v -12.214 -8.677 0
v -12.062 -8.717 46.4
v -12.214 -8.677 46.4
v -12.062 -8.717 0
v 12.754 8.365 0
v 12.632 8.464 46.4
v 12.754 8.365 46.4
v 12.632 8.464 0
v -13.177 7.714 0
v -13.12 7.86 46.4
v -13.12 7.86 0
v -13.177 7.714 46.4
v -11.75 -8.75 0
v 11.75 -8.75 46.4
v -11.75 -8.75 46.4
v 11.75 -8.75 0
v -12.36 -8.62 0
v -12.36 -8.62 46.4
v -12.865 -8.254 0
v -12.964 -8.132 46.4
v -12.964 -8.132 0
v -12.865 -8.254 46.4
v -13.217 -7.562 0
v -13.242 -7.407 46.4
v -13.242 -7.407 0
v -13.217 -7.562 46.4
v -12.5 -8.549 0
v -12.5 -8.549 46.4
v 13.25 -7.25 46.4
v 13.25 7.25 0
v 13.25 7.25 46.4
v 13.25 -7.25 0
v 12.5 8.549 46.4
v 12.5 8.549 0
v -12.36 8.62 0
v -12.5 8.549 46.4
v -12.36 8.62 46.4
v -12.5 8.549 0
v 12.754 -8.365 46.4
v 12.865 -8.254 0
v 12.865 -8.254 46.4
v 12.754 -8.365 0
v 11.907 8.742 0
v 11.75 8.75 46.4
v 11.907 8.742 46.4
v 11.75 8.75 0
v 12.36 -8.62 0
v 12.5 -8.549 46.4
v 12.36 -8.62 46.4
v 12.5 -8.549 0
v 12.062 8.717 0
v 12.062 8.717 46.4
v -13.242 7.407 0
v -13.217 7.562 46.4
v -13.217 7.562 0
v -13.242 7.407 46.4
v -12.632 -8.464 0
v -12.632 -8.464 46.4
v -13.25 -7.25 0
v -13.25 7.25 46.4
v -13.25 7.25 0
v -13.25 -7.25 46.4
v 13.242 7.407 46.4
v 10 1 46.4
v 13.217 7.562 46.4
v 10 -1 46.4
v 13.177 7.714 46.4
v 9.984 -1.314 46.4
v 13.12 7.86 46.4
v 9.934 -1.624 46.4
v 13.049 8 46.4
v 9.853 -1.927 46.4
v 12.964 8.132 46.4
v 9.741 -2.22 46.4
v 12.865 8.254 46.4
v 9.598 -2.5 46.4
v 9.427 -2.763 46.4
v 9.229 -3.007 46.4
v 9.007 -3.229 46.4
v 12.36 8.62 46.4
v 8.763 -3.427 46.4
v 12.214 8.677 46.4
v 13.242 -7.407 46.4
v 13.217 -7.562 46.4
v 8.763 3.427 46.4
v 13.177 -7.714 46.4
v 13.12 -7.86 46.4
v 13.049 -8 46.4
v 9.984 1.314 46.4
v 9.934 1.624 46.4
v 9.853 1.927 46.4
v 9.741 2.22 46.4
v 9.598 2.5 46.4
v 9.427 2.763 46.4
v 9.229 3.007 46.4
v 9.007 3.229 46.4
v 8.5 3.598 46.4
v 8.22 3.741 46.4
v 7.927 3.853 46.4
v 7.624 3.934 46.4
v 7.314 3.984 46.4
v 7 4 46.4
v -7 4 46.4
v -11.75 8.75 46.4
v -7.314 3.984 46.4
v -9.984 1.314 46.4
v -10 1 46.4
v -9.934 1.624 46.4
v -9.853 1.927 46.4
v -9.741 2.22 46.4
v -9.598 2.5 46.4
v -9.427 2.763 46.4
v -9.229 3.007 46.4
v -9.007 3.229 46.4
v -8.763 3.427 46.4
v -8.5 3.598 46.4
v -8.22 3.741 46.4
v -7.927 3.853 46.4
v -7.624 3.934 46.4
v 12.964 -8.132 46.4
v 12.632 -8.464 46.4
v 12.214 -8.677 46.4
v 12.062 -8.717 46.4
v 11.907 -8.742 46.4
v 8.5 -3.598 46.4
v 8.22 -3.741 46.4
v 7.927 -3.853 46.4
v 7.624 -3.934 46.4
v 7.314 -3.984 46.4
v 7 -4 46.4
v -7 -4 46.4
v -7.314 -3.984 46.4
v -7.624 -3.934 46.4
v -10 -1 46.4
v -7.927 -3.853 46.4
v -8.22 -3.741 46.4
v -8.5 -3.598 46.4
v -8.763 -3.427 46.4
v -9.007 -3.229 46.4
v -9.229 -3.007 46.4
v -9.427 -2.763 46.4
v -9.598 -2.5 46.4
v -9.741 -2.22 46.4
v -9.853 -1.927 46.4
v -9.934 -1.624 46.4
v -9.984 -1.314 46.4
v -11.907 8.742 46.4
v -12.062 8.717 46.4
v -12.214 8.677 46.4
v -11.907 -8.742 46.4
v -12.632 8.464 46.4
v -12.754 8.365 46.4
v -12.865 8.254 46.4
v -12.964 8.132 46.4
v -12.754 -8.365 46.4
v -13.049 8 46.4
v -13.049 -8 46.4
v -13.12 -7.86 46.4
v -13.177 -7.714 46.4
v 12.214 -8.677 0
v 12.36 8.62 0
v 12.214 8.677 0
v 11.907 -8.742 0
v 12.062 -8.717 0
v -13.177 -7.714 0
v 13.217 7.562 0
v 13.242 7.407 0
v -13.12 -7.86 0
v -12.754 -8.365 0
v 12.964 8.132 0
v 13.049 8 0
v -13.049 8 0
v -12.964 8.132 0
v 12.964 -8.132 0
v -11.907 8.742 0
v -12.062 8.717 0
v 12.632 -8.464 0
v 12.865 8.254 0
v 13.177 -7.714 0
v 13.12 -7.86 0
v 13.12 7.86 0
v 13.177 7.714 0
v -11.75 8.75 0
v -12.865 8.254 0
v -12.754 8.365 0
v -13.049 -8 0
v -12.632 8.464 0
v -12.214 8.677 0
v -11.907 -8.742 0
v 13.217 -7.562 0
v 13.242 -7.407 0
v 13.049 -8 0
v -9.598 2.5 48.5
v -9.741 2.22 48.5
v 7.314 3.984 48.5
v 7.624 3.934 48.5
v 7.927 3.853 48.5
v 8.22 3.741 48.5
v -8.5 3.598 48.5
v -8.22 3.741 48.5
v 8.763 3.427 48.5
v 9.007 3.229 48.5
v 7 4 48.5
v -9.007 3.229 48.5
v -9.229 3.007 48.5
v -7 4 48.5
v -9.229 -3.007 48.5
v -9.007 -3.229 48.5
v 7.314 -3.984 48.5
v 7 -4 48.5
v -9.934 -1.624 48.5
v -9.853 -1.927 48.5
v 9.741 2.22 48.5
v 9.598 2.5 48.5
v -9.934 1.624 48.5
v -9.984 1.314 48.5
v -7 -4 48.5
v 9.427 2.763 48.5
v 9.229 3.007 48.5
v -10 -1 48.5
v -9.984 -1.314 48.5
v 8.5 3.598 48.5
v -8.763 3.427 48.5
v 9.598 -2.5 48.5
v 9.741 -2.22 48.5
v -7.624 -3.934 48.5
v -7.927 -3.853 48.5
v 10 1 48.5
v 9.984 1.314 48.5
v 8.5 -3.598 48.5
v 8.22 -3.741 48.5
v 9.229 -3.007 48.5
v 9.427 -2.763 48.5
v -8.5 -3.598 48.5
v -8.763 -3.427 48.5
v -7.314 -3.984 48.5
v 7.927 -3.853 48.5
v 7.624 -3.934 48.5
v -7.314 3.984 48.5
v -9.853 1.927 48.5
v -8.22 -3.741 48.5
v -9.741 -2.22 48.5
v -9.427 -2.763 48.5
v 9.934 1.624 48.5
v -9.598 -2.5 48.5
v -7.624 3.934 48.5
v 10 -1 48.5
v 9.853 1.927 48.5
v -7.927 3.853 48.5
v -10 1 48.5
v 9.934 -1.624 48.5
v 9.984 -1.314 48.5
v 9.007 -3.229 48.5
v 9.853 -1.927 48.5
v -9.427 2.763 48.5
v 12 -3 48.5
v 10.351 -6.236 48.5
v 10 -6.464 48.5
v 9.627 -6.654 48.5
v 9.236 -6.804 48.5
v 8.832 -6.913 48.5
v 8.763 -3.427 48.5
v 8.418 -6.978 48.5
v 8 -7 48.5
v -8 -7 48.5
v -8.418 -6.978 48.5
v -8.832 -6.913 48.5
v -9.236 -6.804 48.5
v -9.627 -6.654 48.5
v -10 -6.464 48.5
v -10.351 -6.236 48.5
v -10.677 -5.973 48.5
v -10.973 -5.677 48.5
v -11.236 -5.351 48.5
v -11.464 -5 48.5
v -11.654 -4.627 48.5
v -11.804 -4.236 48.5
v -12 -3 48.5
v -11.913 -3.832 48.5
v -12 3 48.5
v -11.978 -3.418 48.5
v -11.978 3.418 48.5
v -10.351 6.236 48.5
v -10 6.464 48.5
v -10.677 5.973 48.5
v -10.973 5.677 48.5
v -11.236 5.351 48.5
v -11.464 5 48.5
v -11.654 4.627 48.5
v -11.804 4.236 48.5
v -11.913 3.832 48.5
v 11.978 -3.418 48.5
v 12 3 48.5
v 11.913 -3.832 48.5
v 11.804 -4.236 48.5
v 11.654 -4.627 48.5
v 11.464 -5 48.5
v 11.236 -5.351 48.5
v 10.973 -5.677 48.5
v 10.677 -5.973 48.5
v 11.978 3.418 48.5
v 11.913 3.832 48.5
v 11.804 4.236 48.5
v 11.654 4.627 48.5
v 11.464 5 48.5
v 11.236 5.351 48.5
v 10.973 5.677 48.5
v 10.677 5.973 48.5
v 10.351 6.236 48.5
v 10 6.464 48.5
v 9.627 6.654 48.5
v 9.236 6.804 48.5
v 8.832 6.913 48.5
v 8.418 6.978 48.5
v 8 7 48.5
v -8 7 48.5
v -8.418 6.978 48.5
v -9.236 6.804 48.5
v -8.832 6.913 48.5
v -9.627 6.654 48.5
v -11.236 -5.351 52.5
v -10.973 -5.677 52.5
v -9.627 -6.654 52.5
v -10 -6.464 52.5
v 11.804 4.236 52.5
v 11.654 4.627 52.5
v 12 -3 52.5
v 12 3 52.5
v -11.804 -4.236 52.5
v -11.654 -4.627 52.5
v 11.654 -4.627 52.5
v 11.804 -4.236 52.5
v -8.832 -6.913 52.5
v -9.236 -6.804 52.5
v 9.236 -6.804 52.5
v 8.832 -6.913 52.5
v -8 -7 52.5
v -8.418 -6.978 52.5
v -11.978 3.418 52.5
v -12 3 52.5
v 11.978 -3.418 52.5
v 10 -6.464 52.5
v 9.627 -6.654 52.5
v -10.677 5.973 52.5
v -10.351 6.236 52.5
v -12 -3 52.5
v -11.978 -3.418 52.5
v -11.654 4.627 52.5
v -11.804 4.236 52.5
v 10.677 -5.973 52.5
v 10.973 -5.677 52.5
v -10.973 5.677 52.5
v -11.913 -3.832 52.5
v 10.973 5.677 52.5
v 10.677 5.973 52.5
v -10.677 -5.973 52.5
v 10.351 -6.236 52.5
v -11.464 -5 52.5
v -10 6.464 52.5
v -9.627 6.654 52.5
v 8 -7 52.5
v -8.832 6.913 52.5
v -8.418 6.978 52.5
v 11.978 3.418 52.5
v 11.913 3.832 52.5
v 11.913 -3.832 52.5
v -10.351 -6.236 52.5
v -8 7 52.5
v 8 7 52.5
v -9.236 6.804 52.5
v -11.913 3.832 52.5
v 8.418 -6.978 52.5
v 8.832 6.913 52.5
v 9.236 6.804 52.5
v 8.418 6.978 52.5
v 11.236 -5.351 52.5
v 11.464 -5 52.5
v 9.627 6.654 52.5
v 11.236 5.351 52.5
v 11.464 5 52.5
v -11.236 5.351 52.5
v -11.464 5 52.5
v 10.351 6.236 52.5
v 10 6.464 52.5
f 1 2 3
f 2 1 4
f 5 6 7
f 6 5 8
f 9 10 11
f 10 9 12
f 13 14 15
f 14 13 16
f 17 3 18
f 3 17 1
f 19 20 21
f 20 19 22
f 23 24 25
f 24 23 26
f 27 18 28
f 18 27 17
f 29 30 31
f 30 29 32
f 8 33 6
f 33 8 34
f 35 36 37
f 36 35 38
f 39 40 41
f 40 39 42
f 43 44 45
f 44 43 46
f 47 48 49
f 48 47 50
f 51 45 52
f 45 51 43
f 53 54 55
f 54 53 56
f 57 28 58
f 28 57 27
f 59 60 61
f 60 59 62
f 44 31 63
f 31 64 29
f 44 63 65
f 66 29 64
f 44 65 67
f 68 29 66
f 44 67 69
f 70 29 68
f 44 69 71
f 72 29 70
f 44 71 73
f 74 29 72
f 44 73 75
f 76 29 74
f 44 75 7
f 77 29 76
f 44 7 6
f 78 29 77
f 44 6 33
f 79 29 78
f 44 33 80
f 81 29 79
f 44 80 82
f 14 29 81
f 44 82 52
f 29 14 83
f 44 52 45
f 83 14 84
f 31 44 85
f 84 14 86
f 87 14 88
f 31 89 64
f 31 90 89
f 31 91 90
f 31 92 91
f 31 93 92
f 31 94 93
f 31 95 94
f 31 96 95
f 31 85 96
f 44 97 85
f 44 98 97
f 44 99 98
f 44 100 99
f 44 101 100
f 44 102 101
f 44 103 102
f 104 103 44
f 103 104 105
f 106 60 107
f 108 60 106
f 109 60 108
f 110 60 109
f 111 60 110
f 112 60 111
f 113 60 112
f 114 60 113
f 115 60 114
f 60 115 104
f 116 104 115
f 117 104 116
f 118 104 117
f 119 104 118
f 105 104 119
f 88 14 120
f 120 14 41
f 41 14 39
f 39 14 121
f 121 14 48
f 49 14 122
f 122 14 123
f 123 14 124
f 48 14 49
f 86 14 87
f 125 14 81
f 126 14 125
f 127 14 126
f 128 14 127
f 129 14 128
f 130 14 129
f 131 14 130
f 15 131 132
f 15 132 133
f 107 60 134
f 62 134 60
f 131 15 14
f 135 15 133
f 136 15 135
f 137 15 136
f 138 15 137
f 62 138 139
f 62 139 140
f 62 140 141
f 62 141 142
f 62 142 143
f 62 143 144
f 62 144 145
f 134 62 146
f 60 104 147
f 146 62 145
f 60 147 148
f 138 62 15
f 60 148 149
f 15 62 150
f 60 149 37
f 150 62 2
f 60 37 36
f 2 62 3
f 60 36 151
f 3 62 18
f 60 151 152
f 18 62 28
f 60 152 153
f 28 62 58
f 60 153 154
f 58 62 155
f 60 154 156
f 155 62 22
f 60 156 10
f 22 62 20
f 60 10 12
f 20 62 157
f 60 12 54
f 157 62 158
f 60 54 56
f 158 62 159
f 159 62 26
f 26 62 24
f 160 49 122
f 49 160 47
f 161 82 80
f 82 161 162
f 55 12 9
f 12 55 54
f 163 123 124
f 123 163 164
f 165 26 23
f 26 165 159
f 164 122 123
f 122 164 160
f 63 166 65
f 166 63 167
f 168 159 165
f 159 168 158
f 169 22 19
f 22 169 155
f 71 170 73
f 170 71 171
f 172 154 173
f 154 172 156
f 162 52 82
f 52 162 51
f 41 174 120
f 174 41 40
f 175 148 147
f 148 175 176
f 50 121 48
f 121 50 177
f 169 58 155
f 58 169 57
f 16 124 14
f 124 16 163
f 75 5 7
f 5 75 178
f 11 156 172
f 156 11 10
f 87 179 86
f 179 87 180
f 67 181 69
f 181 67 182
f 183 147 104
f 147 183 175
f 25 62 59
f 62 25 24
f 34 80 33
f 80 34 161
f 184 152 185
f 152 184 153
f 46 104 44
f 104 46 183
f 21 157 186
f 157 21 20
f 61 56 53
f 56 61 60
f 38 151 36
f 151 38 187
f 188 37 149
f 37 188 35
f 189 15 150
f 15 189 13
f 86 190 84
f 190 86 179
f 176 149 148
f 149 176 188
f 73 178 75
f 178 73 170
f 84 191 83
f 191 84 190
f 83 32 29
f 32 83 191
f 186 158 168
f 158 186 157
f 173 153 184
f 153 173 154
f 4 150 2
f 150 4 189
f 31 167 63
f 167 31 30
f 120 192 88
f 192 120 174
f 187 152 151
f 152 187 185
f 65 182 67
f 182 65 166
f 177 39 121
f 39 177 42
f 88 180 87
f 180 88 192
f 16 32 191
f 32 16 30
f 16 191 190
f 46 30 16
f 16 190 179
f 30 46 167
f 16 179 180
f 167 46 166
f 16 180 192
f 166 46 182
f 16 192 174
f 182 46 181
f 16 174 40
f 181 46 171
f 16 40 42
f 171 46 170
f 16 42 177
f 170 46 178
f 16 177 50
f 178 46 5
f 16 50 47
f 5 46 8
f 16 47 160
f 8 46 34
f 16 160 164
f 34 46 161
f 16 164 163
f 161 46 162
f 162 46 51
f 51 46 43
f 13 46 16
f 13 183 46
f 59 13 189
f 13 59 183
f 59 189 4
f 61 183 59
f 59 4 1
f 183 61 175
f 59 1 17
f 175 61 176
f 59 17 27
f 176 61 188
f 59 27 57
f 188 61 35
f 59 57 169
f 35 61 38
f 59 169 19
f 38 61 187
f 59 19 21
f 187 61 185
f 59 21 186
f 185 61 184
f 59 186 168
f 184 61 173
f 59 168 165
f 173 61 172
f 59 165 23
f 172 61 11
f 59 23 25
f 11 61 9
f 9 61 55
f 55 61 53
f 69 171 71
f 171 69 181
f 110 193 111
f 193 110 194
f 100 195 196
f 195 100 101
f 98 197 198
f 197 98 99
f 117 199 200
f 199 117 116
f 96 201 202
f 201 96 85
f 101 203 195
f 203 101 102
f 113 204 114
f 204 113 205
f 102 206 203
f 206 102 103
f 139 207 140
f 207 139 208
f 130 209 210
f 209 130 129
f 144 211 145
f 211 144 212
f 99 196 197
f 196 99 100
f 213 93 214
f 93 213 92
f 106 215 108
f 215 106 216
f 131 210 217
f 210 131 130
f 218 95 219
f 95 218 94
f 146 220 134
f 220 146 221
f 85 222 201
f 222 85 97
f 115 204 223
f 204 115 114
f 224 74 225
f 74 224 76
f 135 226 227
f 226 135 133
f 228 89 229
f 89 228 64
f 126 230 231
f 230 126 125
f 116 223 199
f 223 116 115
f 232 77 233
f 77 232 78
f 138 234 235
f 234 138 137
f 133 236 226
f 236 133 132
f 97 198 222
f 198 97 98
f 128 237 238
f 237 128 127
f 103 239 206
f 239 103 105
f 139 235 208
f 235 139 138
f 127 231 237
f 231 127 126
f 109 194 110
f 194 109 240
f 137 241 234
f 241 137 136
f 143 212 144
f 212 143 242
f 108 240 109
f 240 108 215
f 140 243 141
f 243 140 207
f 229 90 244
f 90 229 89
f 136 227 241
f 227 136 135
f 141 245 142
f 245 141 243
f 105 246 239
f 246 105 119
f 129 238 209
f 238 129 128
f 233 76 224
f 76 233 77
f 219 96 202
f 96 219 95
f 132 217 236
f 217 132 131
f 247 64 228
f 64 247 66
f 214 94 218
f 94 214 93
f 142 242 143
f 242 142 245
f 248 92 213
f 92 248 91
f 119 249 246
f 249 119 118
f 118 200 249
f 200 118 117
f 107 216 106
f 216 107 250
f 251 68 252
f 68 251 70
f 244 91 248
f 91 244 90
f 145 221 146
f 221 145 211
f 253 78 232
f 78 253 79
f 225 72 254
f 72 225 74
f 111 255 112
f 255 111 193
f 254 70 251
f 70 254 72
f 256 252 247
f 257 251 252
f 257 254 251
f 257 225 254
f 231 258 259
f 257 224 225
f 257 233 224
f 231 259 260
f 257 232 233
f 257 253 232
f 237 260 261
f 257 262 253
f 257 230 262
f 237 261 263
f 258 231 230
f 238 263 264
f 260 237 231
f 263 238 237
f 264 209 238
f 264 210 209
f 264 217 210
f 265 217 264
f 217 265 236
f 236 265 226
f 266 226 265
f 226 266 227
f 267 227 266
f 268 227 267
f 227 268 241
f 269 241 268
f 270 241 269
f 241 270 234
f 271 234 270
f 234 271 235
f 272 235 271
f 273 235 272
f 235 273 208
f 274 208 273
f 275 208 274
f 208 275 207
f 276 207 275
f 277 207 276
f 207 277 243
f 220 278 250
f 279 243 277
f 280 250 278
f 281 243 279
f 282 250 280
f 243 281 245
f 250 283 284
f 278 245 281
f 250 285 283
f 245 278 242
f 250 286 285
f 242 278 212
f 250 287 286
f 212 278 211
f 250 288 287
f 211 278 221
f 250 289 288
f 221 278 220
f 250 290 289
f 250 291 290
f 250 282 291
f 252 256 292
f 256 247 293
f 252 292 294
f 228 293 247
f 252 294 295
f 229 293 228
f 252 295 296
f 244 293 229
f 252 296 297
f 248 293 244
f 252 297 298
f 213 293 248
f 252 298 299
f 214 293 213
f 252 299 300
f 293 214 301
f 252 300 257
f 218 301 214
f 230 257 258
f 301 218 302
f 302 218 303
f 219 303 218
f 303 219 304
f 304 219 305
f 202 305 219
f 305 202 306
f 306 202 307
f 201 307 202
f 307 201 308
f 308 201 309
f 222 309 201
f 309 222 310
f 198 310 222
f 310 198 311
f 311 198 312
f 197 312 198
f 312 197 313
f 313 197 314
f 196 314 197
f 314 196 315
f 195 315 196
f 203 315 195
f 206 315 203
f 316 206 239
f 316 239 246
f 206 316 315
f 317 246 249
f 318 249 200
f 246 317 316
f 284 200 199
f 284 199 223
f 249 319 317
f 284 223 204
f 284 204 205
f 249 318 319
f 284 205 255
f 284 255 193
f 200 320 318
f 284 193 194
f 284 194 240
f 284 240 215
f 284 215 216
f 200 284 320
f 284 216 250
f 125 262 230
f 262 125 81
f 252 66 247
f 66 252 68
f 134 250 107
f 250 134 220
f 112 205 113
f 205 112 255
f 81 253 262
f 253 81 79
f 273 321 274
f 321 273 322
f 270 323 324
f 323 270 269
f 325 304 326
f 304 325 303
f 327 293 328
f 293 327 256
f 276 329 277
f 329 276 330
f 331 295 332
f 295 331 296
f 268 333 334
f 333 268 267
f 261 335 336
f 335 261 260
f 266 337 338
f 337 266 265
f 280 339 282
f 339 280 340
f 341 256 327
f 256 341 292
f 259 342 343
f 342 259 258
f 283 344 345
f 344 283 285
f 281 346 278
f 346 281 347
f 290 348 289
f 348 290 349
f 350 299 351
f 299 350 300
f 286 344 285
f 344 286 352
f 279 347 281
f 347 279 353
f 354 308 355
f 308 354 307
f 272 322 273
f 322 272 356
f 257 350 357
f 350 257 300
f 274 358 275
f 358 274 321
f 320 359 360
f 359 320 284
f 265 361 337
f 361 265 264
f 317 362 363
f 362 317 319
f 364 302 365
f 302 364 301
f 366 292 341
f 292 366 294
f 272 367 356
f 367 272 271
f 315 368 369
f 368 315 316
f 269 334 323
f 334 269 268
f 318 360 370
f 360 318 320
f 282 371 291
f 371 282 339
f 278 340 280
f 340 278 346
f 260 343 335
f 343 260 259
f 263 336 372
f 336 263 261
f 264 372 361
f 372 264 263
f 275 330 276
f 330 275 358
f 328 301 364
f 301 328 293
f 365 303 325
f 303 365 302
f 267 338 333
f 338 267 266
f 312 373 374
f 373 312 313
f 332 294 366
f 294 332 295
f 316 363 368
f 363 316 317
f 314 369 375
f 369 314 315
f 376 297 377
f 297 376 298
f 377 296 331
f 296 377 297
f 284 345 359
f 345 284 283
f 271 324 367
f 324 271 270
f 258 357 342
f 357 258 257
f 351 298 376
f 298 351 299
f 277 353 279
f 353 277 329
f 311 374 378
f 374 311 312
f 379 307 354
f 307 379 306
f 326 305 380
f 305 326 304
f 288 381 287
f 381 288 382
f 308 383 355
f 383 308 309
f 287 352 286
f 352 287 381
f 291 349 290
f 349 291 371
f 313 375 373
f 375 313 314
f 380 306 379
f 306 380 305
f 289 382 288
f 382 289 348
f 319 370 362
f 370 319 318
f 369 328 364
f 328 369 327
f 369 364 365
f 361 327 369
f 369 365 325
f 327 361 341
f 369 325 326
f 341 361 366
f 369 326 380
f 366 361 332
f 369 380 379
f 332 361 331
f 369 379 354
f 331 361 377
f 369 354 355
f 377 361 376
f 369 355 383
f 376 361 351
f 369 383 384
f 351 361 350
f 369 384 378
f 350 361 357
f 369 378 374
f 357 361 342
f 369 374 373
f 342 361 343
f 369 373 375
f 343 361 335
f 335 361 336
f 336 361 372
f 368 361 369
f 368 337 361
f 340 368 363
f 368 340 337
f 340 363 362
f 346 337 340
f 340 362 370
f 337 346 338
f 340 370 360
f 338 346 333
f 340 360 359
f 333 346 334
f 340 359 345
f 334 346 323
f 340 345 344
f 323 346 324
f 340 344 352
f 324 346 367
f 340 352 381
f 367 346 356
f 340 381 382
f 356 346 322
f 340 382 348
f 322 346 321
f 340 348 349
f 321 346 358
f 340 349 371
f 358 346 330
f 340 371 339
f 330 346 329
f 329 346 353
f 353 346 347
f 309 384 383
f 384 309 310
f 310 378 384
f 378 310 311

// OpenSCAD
// file: battery9vModelBlank_h.scad
//
//
//
	b9mb_battery9vTotalHeigth = 48.5;

	b9mb_battery9vBodyWidth = 26.5;
	b9mb_battery9vBodyDepth = 17.5;
	b9mb_battery9vBodyHeigth = 46.4;
	
	b9mb_battery9vConnectorsHeigth =
		b9mb_battery9vTotalHeigth - b9mb_battery9vBodyHeigth;
    
  b9mb_battery9vExternalConnectorHeigth = 4;

	b9mb_battery9vTotalHeigthExternal = 
    b9mb_battery9vTotalHeigth+b9mb_battery9vExternalConnectorHeigth;
// main file
$fn=60;

include<battery9vModelBlank_h.scad>;

b9mb_battery9vModelBlank(true);

/////////////////////////////////////////////////////////////
module b9mb_battery9vModelBlank(batteryExernalCenter=false, batteryCenter=false){

	union(){
		translate([0,0,b9mb_battery9vBodyHeigth/2])
		// Body
			color("grey")
			b9mb_plate4Point(
				b9mb_battery9vBodyWidth,
				b9mb_battery9vBodyDepth,
				b9mb_battery9vBodyHeigth,
				3
			);
			
		// Connector
		translate([0,0,
			(b9mb_battery9vBodyHeigth/2)+b9mb_battery9vConnectorsHeigth]
		)
			color("silver")
			b9mb_plate4Point(20,8,b9mb_battery9vBodyHeigth,6);	
		if(batteryExernalCenter==true){
			translate([0,0,b9mb_battery9vTotalHeigth+(b9mb_battery9vExternalConnectorHeigth/2)])
				b9mb_battery9vExternalConnector();
		}
	}
}
/////////////////////////////////////////////////////////////
module b9mb_battery9vExternalConnector(){

    b9mb_plate4Point(24,14,b9mb_battery9vExternalConnectorHeigth,8);	
}
/////////////////////////////////////////////////////////////
module b9mb_plate4Point(x,y,z,d){
	hull(){
		color("green") translate([(x/2)-(d/2) ,(y/2) -(d/2),0]) cylinder(h=z, d=d, center=true);
		color("blue")  translate([(x/2)-(d/2) ,-(y/2)+(d/2),0]) cylinder(h=z, d=d, center=true);
		color("red")   translate([-(x/2)+(d/2),(y/2) -(d/2),0]) cylinder(h=z, d=d, center=true);
		color("grey")  translate([-(x/2)+(d/2),-(y/2)+(d/2),0]) cylinder(h=z, d=d, center=true);
	}
}
